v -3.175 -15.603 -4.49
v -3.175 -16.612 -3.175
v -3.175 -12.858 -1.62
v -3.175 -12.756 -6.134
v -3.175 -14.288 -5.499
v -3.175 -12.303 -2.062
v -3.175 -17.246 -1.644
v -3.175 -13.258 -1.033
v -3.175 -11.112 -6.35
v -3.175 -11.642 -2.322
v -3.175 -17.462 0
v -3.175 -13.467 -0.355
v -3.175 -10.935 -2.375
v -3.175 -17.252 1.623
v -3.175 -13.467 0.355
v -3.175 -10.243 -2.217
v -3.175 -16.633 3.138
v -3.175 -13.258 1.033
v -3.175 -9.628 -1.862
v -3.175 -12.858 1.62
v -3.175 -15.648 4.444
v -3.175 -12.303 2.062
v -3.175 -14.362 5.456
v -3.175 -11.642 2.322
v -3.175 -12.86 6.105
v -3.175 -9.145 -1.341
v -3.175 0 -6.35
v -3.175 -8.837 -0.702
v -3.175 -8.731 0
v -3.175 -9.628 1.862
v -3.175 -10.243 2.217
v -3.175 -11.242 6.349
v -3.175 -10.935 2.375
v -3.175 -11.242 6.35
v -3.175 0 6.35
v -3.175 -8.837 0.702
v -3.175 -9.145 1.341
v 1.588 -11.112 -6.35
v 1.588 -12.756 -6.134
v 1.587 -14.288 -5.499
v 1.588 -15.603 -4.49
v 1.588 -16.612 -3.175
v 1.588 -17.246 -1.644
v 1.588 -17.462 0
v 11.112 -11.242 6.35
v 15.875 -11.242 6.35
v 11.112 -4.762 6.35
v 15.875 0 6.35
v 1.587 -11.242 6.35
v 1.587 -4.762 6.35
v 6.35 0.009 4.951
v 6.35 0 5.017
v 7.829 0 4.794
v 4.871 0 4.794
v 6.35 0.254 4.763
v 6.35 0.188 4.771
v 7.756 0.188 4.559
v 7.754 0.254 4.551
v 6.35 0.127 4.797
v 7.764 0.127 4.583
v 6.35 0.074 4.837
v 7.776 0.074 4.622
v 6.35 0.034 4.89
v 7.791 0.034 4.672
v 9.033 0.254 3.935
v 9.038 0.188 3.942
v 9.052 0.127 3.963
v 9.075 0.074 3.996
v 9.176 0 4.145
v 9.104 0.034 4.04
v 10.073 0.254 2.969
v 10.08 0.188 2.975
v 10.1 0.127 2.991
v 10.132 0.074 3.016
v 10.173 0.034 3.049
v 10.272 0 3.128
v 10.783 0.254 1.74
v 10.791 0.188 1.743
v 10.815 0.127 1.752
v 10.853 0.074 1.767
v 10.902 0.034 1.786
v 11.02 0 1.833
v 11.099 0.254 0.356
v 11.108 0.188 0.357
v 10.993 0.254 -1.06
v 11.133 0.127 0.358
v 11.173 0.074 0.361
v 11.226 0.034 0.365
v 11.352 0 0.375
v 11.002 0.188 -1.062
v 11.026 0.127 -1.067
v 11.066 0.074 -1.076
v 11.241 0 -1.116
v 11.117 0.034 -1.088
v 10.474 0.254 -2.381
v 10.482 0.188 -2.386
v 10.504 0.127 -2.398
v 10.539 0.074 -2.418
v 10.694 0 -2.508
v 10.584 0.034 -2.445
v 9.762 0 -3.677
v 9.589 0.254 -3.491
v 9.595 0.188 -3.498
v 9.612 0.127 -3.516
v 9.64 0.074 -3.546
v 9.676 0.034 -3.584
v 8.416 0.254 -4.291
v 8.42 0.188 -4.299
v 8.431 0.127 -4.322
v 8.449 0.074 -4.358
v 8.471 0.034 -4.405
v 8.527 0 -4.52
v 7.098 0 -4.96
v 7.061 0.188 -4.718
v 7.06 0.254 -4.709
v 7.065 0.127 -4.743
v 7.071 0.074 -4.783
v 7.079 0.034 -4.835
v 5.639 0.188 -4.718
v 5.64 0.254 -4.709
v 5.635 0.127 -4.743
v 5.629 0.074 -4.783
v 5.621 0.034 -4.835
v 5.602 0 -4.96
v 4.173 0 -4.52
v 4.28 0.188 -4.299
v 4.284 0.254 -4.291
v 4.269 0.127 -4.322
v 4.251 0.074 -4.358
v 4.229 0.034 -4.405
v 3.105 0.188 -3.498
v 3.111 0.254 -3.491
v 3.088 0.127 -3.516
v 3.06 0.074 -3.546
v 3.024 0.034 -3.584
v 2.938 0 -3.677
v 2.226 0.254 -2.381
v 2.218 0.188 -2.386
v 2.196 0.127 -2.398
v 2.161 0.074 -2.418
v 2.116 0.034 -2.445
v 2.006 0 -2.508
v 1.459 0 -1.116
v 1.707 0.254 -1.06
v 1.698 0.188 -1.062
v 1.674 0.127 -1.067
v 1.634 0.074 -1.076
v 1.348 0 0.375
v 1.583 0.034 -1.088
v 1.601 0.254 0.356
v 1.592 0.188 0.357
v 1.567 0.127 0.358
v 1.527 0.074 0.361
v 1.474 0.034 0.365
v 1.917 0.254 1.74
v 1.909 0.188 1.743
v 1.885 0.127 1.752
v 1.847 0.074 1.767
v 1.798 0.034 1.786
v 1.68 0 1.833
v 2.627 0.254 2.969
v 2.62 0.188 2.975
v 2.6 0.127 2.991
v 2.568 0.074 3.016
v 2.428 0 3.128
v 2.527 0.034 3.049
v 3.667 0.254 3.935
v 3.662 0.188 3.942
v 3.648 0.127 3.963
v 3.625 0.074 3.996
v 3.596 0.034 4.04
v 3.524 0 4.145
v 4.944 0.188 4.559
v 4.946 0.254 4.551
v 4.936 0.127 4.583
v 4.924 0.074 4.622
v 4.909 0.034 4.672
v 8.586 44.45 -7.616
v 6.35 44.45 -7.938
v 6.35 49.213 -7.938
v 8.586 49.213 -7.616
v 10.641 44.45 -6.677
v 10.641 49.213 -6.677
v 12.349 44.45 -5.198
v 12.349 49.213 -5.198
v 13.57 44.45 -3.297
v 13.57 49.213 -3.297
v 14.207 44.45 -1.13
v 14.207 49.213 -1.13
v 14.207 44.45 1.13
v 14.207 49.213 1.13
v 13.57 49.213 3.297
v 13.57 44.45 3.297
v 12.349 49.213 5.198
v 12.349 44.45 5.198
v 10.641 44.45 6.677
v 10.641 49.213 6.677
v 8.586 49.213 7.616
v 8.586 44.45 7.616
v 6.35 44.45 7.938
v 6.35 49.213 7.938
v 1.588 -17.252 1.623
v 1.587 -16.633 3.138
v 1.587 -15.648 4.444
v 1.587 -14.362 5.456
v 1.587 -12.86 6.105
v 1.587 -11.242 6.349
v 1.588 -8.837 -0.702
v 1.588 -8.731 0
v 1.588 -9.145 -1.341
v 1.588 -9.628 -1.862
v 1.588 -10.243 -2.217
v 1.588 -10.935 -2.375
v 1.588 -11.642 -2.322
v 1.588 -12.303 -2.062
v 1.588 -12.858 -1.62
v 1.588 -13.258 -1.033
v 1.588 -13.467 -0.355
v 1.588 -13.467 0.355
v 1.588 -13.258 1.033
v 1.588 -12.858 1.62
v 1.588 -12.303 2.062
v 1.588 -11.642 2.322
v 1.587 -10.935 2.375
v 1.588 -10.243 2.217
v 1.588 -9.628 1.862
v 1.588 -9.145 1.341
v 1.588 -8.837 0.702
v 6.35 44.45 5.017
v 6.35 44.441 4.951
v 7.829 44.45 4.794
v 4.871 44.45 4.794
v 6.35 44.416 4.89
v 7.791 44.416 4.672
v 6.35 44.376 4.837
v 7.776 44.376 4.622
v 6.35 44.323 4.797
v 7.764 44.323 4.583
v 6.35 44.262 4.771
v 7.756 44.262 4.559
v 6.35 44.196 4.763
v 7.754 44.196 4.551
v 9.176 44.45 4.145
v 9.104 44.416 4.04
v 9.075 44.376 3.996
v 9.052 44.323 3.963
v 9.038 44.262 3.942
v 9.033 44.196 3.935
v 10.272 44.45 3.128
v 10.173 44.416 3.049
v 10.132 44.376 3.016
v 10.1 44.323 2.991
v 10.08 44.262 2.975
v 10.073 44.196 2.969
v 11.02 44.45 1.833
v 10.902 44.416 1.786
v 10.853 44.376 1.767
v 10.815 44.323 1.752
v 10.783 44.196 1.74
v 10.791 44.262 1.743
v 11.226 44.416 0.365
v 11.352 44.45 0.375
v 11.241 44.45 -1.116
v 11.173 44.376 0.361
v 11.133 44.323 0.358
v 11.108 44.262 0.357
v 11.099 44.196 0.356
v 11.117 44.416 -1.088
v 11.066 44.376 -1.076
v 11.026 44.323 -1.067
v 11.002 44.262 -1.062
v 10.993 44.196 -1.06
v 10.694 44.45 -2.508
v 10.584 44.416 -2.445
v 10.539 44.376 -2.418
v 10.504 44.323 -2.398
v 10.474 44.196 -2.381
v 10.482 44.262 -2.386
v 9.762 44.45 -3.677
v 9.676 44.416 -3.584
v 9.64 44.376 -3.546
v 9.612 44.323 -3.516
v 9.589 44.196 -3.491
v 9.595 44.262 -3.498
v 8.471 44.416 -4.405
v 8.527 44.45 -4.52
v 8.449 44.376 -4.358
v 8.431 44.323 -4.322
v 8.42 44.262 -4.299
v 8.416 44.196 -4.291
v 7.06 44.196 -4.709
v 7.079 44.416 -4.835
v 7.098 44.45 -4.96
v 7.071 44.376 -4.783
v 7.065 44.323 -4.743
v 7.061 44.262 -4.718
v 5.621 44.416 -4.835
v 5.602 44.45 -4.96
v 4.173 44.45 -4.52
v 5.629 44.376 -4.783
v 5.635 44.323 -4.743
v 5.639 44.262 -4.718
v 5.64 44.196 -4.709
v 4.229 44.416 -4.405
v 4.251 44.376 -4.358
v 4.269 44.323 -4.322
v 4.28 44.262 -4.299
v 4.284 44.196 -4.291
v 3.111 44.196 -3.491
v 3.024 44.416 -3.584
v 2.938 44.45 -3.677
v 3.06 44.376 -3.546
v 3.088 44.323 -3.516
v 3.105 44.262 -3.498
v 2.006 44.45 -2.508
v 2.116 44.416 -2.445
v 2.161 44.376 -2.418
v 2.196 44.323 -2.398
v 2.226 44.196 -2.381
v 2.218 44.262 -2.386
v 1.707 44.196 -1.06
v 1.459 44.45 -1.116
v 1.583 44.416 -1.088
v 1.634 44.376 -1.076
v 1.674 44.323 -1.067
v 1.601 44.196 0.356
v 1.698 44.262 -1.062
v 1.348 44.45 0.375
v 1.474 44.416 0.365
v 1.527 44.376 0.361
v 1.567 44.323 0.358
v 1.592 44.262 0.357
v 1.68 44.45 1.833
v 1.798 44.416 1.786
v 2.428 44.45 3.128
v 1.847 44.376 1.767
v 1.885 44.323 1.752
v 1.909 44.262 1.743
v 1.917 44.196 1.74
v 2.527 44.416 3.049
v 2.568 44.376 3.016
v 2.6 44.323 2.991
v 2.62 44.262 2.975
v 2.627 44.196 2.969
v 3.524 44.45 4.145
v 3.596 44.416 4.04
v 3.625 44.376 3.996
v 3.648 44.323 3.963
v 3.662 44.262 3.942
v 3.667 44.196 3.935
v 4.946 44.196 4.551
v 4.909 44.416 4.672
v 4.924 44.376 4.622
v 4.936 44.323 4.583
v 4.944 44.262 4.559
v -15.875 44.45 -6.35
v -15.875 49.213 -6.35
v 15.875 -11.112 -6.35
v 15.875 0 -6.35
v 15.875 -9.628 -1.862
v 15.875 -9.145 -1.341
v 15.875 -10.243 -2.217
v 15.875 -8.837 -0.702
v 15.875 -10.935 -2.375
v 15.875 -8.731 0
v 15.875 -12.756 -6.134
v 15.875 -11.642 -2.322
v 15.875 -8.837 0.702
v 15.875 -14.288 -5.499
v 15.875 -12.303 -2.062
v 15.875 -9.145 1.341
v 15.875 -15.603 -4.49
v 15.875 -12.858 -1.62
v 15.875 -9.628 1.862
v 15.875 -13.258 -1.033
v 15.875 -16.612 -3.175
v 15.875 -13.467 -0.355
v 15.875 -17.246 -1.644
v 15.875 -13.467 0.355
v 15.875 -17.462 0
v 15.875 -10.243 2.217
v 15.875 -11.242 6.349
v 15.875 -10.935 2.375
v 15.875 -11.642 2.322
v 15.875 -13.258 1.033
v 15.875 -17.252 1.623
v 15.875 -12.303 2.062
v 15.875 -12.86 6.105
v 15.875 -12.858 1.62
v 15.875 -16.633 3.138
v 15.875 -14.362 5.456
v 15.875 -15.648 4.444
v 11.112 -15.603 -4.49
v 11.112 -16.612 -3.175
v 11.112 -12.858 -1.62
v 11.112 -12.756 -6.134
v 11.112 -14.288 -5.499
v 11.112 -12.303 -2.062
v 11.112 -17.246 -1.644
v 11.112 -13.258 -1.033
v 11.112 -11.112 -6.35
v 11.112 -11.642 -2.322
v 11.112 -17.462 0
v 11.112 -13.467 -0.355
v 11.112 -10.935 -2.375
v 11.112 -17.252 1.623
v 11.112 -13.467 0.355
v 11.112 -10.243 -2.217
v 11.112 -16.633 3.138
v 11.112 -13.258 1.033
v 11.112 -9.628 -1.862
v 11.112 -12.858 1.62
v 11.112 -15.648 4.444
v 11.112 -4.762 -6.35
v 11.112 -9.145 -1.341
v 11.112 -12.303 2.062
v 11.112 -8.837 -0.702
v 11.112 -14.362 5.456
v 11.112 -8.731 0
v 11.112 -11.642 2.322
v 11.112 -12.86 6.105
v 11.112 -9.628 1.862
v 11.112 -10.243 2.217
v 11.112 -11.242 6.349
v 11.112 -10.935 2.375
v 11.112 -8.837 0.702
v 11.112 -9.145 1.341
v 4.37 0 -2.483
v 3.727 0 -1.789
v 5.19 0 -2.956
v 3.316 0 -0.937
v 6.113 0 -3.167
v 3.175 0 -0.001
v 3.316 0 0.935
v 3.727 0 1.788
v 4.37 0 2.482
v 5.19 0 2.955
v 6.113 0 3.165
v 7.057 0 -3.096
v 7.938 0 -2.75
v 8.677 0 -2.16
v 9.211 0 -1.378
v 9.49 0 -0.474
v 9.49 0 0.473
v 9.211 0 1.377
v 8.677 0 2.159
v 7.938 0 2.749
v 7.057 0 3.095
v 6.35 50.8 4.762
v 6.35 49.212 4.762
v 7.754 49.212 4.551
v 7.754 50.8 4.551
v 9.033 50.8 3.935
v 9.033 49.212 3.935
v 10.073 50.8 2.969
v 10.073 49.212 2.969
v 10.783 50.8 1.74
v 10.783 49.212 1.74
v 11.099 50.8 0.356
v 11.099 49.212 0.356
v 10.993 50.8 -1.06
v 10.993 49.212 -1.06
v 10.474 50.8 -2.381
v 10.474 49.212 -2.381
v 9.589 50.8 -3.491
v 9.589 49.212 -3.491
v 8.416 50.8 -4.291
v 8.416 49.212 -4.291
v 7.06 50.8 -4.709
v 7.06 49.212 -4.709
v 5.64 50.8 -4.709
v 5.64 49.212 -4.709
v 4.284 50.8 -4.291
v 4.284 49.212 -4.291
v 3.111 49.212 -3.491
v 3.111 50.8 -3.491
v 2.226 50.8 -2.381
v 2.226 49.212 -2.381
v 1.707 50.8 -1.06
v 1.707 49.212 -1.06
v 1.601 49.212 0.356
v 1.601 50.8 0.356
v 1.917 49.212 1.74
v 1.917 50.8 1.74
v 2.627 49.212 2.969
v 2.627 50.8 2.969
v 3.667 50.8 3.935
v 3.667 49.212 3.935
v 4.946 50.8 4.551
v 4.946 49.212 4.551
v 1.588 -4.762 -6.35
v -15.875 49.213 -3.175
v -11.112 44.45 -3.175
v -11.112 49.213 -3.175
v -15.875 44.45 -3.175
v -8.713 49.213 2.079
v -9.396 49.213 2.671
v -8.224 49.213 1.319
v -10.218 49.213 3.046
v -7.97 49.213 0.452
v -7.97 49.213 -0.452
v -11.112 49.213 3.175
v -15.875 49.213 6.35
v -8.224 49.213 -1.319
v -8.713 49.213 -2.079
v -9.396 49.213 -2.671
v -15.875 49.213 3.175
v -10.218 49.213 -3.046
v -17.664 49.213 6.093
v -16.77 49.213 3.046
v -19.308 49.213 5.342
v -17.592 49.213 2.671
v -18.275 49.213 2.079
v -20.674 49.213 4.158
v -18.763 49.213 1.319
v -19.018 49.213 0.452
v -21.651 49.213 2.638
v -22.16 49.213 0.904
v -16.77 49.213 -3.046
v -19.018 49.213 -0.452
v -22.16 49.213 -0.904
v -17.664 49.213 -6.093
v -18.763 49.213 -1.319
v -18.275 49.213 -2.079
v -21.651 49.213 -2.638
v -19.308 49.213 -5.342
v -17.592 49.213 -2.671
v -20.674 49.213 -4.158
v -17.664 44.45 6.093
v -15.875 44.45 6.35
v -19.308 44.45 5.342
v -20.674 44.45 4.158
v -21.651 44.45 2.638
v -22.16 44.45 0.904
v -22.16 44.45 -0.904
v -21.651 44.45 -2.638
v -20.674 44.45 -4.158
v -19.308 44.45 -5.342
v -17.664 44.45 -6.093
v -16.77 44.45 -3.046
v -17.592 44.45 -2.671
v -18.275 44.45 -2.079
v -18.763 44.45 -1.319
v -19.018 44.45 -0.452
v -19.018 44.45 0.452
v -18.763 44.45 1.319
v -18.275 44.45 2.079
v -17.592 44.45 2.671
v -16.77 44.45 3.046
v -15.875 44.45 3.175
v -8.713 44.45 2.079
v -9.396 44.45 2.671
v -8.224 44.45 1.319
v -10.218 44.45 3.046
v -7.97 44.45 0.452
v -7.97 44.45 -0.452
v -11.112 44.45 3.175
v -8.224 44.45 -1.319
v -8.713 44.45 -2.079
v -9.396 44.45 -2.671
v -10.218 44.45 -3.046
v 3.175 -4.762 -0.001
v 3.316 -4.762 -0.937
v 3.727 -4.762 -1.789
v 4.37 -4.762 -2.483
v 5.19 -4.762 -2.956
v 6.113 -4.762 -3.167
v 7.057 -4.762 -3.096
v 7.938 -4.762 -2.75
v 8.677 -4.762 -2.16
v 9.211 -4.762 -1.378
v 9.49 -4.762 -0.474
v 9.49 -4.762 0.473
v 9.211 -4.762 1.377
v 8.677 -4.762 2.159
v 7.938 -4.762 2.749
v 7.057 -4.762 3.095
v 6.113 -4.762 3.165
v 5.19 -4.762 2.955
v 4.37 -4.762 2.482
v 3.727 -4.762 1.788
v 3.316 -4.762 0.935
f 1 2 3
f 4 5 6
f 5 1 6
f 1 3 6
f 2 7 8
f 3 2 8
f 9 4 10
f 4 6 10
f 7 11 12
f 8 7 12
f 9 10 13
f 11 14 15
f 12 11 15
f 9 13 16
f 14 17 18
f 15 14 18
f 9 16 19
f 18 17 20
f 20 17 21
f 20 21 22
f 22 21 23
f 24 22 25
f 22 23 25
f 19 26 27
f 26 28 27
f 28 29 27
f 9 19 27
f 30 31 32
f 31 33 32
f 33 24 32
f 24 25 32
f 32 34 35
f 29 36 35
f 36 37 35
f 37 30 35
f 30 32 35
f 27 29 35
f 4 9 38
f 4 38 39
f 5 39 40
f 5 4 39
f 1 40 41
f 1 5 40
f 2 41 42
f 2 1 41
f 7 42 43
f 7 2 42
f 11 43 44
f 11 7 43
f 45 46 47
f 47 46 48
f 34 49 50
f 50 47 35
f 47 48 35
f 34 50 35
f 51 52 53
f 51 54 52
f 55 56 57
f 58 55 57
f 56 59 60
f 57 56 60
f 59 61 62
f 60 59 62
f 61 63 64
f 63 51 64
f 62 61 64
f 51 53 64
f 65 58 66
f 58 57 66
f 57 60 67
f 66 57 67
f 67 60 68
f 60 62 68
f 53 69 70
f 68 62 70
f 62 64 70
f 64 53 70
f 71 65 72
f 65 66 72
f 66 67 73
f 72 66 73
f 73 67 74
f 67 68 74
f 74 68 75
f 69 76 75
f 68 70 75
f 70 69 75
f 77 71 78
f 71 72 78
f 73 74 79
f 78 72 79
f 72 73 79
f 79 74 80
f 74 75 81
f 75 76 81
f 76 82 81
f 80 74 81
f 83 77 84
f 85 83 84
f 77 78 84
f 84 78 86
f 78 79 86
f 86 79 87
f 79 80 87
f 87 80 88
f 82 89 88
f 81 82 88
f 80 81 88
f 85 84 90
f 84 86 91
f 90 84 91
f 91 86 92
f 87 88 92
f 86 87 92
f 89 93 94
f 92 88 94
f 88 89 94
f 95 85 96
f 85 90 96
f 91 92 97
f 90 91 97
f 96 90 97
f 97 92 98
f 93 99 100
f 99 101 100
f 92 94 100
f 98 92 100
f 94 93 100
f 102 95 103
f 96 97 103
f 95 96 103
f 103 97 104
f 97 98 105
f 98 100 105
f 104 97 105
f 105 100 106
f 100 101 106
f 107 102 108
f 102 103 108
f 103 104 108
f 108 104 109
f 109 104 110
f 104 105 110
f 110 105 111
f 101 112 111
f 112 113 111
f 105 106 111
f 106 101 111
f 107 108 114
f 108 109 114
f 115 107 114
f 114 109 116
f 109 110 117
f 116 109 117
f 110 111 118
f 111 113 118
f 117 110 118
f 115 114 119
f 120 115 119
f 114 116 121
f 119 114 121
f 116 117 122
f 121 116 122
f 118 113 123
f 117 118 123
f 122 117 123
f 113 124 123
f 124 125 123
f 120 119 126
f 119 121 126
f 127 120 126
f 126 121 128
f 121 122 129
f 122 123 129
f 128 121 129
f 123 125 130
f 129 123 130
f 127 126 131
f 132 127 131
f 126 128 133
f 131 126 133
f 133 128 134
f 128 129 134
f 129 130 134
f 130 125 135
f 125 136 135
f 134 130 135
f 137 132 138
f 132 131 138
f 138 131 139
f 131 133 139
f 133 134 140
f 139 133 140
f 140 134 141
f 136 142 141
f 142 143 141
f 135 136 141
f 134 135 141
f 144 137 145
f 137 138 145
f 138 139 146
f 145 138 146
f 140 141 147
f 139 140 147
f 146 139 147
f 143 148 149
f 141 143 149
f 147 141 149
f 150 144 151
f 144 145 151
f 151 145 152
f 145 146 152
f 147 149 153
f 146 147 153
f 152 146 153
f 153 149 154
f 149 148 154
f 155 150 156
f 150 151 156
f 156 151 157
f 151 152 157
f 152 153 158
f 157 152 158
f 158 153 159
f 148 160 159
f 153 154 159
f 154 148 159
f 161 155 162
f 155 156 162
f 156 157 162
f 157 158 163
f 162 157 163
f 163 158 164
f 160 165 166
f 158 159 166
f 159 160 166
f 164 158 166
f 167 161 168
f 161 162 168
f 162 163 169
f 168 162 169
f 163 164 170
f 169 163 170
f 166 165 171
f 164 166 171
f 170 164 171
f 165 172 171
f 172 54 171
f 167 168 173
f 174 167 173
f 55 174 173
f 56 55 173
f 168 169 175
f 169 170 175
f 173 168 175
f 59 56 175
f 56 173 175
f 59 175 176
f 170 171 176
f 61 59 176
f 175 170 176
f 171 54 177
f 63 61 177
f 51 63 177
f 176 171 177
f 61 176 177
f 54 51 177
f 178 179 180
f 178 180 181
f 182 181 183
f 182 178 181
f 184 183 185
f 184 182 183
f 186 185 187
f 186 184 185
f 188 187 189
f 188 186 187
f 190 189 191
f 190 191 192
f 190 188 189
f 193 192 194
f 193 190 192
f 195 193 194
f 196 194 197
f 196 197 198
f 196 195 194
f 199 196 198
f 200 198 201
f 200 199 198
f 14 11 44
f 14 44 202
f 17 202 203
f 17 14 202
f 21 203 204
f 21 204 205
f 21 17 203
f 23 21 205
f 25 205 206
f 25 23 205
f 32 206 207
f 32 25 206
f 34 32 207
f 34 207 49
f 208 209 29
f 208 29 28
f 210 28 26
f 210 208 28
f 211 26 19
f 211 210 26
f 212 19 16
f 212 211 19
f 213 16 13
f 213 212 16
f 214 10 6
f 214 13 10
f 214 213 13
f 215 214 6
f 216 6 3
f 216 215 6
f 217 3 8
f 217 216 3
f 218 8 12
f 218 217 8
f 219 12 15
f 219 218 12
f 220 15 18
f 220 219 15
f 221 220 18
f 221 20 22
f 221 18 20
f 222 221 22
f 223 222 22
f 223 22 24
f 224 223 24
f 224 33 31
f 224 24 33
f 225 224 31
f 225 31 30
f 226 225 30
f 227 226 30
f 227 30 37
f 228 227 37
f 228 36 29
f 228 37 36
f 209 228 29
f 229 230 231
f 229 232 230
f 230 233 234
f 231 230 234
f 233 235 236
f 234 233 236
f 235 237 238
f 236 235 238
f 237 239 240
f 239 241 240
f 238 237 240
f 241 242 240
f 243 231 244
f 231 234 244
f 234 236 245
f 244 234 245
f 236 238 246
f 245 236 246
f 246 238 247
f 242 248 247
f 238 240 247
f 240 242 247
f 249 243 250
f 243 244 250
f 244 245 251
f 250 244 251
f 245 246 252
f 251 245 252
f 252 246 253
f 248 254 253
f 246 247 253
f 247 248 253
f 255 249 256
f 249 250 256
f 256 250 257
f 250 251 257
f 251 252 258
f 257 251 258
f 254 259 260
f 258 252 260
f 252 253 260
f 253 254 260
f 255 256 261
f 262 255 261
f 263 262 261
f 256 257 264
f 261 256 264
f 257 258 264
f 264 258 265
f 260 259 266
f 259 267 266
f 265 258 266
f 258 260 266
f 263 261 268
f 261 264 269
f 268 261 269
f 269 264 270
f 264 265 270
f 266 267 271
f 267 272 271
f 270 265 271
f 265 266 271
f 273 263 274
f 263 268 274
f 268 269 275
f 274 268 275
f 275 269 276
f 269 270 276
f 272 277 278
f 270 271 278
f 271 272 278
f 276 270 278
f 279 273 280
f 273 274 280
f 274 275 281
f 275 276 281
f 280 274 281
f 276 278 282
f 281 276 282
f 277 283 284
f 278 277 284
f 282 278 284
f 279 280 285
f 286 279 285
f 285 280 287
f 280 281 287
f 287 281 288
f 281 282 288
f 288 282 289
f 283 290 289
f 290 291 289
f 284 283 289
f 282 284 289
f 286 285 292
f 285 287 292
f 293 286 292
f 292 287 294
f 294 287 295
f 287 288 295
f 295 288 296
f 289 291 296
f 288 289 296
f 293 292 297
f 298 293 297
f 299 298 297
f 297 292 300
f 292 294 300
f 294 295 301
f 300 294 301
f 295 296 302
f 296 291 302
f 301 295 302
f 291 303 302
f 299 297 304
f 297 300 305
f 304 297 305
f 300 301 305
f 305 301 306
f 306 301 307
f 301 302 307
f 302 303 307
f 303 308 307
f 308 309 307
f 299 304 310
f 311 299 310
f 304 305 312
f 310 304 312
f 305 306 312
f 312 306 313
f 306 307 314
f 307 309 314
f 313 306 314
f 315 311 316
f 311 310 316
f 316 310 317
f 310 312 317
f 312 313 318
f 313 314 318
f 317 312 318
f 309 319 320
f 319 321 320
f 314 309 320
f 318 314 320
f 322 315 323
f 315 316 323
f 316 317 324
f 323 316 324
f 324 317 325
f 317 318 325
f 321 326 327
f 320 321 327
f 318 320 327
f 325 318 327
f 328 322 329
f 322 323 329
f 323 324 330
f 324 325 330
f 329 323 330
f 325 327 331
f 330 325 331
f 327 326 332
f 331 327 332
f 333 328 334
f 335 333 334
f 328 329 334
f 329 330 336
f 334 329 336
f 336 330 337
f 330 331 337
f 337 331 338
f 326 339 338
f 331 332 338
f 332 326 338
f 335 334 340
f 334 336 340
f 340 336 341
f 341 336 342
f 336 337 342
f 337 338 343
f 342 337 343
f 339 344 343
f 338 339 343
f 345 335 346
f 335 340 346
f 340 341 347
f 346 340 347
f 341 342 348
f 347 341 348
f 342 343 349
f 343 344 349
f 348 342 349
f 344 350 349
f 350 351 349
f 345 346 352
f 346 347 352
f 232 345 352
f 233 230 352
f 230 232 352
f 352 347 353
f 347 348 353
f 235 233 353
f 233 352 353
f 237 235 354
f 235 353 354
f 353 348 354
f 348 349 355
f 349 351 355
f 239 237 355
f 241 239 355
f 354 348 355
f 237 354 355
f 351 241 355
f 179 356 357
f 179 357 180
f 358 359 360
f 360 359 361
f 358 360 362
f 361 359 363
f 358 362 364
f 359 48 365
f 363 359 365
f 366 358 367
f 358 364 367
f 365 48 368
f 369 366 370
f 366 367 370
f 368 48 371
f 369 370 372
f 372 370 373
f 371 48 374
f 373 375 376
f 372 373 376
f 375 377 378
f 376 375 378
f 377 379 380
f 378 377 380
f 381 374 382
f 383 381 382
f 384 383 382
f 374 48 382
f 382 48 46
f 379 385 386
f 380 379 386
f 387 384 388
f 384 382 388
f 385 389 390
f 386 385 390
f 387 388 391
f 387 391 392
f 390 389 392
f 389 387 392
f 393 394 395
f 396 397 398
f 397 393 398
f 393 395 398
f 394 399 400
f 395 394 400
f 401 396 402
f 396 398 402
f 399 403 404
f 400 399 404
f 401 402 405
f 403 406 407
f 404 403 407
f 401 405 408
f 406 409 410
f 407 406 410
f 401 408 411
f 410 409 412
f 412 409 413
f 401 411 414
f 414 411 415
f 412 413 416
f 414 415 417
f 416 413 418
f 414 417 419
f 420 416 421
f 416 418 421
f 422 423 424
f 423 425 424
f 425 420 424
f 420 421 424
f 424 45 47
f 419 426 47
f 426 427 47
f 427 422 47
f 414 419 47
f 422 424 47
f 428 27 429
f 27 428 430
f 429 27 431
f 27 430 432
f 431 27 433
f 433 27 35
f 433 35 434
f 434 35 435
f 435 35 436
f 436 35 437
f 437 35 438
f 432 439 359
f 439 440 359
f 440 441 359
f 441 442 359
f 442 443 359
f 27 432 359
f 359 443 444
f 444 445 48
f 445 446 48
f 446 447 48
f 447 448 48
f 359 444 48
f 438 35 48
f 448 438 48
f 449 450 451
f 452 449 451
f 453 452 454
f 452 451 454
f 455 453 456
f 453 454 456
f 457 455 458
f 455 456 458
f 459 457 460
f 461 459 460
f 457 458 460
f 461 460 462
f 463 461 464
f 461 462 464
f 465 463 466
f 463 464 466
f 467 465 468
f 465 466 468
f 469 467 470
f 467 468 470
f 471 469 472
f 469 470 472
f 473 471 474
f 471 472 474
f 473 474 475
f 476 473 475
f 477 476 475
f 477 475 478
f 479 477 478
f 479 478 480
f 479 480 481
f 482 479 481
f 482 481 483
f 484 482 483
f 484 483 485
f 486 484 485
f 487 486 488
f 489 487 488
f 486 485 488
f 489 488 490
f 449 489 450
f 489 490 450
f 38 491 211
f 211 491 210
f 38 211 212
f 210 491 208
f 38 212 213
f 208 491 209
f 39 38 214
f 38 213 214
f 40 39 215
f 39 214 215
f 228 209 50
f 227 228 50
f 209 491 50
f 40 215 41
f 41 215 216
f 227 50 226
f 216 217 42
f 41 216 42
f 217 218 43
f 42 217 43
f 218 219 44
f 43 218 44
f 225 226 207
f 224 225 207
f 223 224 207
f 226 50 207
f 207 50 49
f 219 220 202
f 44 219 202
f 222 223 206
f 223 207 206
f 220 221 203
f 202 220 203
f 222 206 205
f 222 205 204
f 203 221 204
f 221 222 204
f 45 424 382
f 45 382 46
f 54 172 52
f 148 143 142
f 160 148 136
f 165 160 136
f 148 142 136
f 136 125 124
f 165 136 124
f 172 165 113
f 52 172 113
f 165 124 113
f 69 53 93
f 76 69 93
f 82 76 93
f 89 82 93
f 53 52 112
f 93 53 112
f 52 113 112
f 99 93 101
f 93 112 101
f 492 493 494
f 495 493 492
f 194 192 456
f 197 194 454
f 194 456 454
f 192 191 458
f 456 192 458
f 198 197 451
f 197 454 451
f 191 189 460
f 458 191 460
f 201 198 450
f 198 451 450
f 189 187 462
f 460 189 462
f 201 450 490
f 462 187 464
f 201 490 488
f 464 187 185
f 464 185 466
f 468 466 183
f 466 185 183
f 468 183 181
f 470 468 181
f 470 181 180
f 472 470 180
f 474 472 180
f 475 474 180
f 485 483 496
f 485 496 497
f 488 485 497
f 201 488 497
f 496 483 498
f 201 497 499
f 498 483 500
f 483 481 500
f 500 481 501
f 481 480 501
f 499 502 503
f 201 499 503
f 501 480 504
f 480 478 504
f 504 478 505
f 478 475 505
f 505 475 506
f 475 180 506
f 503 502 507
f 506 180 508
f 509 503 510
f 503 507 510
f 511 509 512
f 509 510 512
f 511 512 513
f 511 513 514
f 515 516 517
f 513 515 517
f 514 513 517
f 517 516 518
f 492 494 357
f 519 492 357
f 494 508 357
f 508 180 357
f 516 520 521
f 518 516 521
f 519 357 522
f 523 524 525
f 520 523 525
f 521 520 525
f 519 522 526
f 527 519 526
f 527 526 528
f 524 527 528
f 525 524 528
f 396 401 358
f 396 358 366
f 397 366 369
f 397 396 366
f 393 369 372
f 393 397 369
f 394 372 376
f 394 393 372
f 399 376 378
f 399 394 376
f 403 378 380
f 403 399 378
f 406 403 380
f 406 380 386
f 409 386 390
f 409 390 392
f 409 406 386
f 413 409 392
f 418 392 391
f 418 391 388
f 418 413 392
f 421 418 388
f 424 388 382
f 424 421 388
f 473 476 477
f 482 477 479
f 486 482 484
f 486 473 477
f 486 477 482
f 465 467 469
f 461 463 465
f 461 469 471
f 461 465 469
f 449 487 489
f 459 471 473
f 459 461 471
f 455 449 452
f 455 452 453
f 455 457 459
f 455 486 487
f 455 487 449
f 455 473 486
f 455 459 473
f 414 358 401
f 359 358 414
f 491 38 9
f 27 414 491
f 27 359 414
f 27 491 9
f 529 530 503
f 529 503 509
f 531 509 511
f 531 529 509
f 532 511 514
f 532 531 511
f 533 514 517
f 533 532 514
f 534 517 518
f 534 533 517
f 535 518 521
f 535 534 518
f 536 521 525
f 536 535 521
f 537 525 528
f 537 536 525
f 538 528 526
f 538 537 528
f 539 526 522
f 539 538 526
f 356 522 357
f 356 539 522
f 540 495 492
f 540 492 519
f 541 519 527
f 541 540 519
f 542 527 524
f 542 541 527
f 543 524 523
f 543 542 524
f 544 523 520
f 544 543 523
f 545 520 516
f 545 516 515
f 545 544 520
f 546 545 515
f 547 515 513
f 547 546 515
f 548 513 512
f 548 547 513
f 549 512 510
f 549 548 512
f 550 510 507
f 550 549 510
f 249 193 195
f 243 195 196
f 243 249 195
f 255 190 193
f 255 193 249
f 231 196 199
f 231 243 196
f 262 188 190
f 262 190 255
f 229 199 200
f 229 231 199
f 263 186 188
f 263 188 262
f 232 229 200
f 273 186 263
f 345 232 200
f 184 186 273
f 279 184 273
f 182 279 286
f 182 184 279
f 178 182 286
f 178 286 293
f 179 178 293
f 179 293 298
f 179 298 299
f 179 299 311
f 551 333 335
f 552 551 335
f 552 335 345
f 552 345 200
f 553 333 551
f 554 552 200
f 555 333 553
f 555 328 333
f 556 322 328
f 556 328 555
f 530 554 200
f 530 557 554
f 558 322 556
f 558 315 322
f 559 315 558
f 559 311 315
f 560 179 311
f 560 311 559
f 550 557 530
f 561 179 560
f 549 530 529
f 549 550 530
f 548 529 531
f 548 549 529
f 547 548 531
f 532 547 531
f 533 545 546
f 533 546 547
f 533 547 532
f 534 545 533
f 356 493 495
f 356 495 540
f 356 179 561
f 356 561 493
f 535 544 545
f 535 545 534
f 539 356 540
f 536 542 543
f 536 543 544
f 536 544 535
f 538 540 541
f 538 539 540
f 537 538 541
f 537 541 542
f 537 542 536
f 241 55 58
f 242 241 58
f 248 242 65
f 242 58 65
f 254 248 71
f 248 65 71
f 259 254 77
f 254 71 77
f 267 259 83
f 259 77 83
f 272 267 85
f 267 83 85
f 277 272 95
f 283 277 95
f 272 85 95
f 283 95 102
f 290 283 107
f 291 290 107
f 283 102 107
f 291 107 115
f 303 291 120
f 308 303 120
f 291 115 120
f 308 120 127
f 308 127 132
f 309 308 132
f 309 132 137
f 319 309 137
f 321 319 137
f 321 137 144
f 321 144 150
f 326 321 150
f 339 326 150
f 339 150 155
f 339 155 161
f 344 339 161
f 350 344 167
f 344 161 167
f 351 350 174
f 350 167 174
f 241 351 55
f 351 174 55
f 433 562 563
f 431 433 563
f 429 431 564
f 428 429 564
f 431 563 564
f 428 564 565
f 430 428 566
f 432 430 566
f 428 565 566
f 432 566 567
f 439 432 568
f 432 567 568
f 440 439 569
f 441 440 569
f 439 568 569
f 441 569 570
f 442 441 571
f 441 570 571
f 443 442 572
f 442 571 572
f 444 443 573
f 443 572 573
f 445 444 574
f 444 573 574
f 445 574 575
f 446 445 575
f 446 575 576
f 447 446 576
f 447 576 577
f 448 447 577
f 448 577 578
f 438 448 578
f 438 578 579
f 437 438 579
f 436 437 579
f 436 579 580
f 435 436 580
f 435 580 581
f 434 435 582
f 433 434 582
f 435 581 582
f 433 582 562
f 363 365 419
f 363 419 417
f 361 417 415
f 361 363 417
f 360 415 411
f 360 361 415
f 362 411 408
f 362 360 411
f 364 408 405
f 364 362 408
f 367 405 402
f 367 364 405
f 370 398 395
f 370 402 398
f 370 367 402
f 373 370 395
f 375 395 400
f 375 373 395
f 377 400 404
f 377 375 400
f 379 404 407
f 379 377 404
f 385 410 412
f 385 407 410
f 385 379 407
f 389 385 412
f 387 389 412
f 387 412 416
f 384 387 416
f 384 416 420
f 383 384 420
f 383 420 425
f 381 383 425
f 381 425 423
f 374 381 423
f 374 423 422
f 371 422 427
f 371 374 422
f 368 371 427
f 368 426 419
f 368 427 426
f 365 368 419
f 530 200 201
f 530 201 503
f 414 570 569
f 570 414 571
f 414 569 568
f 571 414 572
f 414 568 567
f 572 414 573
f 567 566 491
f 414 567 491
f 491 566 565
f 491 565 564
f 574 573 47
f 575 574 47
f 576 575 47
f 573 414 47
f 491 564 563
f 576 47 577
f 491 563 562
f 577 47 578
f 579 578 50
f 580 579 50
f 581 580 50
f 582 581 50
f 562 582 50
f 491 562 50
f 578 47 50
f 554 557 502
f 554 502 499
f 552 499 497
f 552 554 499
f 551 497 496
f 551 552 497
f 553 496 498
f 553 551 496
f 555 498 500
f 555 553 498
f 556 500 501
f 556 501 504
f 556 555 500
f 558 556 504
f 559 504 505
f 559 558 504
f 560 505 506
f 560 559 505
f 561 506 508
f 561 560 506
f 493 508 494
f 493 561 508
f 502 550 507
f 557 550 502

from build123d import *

# Parameters (mm, degrees)
BOSS_EXTRUDE1_DEPTH     = 12.7
CUT_EXTRUDE1_DEPTH      = 29.794641971
CUT_EXTRUDE1_DEPTH_BACK = 29.794641971
CUT_EXTRUDE2_DEPTH      = 29.794641971
CUT_EXTRUDE2_DEPTH_BACK = 29.794641971
SKETCH3_R               = 2.38125
SKETCH4_R               = 4.7625
BOSS_EXTRUDE2_DEPTH     = 44.45
BOSS_EXTRUDE3_DEPTH     = 4.7625
SKETCH6_R               = 4.7625
BOSS_EXTRUDE4_DEPTH     = 1.5875
SKETCH7_R               = 3.175
CUT_EXTRUDE3_DEPTH      = 4.7625
FILLET1_R               = 0.254
BODY_MOVE_COPY4_ANGLE   = 90


with BuildPart() as part:
    # Sketch1 → Boss-Extrude1 (new body)
    with BuildSketch(Plane(origin=(0, 0, 0), x_dir=(0, 0, -1), z_dir=(1, 0, 0))):
        Polygon((9.525, 0), (-9.525, 0), (-9.525, -17.4625), (-4.7625, -17.4625), (-4.7625, -4.7625), (4.7625, -4.7625), (4.7625, -17.4625), (9.525, -17.4625), align=None)
    extrude(amount=BOSS_EXTRUDE1_DEPTH)

    # Sketch2 → Cut-Extrude1 (cut, two sides: drawn at the far end of the back side and taken through both)
    with BuildSketch(Plane.XY.offset(9.525).offset(-CUT_EXTRUDE1_DEPTH_BACK)):
        with BuildLine():
            ThreePointArc((12.7, -11.1125), (10.840128061, -15.602628061), (6.35, -17.4625))
            Line((6.35, -17.4625), (12.7, -17.4625))
            Line((12.7, -17.4625), (12.7, -11.1125))
        make_face()
        with BuildLine():
            Line((0.001322974, -11.242114905), (0, -11.242128408))
            Line((0, -11.242128408), (0, -17.4625))
            Line((0, -17.4625), (6.35, -17.4625))
            ThreePointArc((6.35, -17.4625), (1.905933993, -15.648222359), (0.001322974, -11.242114905))
        make_face()
    extrude(amount=CUT_EXTRUDE1_DEPTH + CUT_EXTRUDE1_DEPTH_BACK, mode=Mode.SUBTRACT)

    # Sketch3 → Cut-Extrude2 (cut, two sides: drawn at the far end of the back side and taken through both)
    with BuildSketch(Plane(origin=(0, 0, -9.525), x_dir=(-1, 0, 0), z_dir=(0, 0, -1)).offset(-CUT_EXTRUDE2_DEPTH_BACK)):
        with Locations((-6.35, -11.1125)):
            Circle(SKETCH3_R)
    extrude(amount=CUT_EXTRUDE2_DEPTH + CUT_EXTRUDE2_DEPTH_BACK, mode=Mode.SUBTRACT)

    # Sketch4 → Boss-Extrude2 (add)
    with BuildSketch(Plane(origin=(0, 0, 0), x_dir=(1, 0, 0), z_dir=(0, 1, 0))):
        with Locations((6.35, 0)):
            Circle(SKETCH4_R)
    extrude(amount=BOSS_EXTRUDE2_DEPTH)

    # Sketch5 → Boss-Extrude3 (add)
    with BuildSketch(Plane(origin=(0, 44.45, 0), x_dir=(1, 0, 0), z_dir=(0, 1, 0))):
        with BuildLine():
            Line((6.35, 7.9375), (-15.875, 6.35))
            ThreePointArc((-15.875, 6.35), (-22.225, 0), (-15.875, -6.35))
            Line((-15.875, -6.35), (6.35, -7.9375))
            ThreePointArc((6.35, -7.9375), (14.2875, 0), (6.35, 7.9375))
        make_face()
        with BuildLine():
            Line((-11.1125, -3.175), (-15.875, -3.175))
            ThreePointArc((-15.875, -3.175), (-19.05, 0), (-15.875, 3.175))
            Line((-15.875, 3.175), (-11.1125, 3.175))
            ThreePointArc((-11.1125, 3.175), (-7.9375, 0), (-11.1125, -3.175))
        make_face(mode=Mode.SUBTRACT)
    extrude(amount=BOSS_EXTRUDE3_DEPTH)

    # Sketch6 → Boss-Extrude4 (add)
    with BuildSketch(Plane(origin=(0, 49.2125, 0), x_dir=(1, 0, 0), z_dir=(0, 1, 0))):
        with Locations((6.35, 0)):
            Circle(SKETCH6_R)
    extrude(amount=BOSS_EXTRUDE4_DEPTH)

    # Sketch7 → Cut-Extrude3 (cut)
    with BuildSketch(Plane.XZ.offset(4.7625)):
        with Locations((6.350661487, 0)):
            Circle(SKETCH7_R)
    extrude(amount=-CUT_EXTRUDE3_DEPTH, mode=Mode.SUBTRACT)

    # Fillet1
    fillet1_edges = [part.edges().sort_by_distance(p)[0] for p in [
        (1.5875, 0, 0),
        (1.5875, 44.45, 0),
    ]]
    fillet(fillet1_edges, radius=FILLET1_R)


with BuildPart() as body_2:
    # Split2: the piece on the far side of the plane
    add(part.part)
    split(bisect_by=Plane(origin=(12.7, 0, -9.525), x_dir=(0, 0, -1), z_dir=(0, -1, 0)), keep=Keep.BOTTOM)


with BuildPart() as part_1:
    add(part.part)

    # Split2
    split(bisect_by=Plane(origin=(12.7, 0, -9.525), x_dir=(0, 0, -1), z_dir=(0, -1, 0)), keep=Keep.TOP)


with BuildPart() as part_2:
    # Body-Move/Copy4: moved
    add(part_1.part.moved(Location((0, 0, 0))).rotate(Axis((6.35, 0, 0), (0, 1, 0)), BODY_MOVE_COPY4_ANGLE))


solid = Compound([body_2.part, part_2.part])
